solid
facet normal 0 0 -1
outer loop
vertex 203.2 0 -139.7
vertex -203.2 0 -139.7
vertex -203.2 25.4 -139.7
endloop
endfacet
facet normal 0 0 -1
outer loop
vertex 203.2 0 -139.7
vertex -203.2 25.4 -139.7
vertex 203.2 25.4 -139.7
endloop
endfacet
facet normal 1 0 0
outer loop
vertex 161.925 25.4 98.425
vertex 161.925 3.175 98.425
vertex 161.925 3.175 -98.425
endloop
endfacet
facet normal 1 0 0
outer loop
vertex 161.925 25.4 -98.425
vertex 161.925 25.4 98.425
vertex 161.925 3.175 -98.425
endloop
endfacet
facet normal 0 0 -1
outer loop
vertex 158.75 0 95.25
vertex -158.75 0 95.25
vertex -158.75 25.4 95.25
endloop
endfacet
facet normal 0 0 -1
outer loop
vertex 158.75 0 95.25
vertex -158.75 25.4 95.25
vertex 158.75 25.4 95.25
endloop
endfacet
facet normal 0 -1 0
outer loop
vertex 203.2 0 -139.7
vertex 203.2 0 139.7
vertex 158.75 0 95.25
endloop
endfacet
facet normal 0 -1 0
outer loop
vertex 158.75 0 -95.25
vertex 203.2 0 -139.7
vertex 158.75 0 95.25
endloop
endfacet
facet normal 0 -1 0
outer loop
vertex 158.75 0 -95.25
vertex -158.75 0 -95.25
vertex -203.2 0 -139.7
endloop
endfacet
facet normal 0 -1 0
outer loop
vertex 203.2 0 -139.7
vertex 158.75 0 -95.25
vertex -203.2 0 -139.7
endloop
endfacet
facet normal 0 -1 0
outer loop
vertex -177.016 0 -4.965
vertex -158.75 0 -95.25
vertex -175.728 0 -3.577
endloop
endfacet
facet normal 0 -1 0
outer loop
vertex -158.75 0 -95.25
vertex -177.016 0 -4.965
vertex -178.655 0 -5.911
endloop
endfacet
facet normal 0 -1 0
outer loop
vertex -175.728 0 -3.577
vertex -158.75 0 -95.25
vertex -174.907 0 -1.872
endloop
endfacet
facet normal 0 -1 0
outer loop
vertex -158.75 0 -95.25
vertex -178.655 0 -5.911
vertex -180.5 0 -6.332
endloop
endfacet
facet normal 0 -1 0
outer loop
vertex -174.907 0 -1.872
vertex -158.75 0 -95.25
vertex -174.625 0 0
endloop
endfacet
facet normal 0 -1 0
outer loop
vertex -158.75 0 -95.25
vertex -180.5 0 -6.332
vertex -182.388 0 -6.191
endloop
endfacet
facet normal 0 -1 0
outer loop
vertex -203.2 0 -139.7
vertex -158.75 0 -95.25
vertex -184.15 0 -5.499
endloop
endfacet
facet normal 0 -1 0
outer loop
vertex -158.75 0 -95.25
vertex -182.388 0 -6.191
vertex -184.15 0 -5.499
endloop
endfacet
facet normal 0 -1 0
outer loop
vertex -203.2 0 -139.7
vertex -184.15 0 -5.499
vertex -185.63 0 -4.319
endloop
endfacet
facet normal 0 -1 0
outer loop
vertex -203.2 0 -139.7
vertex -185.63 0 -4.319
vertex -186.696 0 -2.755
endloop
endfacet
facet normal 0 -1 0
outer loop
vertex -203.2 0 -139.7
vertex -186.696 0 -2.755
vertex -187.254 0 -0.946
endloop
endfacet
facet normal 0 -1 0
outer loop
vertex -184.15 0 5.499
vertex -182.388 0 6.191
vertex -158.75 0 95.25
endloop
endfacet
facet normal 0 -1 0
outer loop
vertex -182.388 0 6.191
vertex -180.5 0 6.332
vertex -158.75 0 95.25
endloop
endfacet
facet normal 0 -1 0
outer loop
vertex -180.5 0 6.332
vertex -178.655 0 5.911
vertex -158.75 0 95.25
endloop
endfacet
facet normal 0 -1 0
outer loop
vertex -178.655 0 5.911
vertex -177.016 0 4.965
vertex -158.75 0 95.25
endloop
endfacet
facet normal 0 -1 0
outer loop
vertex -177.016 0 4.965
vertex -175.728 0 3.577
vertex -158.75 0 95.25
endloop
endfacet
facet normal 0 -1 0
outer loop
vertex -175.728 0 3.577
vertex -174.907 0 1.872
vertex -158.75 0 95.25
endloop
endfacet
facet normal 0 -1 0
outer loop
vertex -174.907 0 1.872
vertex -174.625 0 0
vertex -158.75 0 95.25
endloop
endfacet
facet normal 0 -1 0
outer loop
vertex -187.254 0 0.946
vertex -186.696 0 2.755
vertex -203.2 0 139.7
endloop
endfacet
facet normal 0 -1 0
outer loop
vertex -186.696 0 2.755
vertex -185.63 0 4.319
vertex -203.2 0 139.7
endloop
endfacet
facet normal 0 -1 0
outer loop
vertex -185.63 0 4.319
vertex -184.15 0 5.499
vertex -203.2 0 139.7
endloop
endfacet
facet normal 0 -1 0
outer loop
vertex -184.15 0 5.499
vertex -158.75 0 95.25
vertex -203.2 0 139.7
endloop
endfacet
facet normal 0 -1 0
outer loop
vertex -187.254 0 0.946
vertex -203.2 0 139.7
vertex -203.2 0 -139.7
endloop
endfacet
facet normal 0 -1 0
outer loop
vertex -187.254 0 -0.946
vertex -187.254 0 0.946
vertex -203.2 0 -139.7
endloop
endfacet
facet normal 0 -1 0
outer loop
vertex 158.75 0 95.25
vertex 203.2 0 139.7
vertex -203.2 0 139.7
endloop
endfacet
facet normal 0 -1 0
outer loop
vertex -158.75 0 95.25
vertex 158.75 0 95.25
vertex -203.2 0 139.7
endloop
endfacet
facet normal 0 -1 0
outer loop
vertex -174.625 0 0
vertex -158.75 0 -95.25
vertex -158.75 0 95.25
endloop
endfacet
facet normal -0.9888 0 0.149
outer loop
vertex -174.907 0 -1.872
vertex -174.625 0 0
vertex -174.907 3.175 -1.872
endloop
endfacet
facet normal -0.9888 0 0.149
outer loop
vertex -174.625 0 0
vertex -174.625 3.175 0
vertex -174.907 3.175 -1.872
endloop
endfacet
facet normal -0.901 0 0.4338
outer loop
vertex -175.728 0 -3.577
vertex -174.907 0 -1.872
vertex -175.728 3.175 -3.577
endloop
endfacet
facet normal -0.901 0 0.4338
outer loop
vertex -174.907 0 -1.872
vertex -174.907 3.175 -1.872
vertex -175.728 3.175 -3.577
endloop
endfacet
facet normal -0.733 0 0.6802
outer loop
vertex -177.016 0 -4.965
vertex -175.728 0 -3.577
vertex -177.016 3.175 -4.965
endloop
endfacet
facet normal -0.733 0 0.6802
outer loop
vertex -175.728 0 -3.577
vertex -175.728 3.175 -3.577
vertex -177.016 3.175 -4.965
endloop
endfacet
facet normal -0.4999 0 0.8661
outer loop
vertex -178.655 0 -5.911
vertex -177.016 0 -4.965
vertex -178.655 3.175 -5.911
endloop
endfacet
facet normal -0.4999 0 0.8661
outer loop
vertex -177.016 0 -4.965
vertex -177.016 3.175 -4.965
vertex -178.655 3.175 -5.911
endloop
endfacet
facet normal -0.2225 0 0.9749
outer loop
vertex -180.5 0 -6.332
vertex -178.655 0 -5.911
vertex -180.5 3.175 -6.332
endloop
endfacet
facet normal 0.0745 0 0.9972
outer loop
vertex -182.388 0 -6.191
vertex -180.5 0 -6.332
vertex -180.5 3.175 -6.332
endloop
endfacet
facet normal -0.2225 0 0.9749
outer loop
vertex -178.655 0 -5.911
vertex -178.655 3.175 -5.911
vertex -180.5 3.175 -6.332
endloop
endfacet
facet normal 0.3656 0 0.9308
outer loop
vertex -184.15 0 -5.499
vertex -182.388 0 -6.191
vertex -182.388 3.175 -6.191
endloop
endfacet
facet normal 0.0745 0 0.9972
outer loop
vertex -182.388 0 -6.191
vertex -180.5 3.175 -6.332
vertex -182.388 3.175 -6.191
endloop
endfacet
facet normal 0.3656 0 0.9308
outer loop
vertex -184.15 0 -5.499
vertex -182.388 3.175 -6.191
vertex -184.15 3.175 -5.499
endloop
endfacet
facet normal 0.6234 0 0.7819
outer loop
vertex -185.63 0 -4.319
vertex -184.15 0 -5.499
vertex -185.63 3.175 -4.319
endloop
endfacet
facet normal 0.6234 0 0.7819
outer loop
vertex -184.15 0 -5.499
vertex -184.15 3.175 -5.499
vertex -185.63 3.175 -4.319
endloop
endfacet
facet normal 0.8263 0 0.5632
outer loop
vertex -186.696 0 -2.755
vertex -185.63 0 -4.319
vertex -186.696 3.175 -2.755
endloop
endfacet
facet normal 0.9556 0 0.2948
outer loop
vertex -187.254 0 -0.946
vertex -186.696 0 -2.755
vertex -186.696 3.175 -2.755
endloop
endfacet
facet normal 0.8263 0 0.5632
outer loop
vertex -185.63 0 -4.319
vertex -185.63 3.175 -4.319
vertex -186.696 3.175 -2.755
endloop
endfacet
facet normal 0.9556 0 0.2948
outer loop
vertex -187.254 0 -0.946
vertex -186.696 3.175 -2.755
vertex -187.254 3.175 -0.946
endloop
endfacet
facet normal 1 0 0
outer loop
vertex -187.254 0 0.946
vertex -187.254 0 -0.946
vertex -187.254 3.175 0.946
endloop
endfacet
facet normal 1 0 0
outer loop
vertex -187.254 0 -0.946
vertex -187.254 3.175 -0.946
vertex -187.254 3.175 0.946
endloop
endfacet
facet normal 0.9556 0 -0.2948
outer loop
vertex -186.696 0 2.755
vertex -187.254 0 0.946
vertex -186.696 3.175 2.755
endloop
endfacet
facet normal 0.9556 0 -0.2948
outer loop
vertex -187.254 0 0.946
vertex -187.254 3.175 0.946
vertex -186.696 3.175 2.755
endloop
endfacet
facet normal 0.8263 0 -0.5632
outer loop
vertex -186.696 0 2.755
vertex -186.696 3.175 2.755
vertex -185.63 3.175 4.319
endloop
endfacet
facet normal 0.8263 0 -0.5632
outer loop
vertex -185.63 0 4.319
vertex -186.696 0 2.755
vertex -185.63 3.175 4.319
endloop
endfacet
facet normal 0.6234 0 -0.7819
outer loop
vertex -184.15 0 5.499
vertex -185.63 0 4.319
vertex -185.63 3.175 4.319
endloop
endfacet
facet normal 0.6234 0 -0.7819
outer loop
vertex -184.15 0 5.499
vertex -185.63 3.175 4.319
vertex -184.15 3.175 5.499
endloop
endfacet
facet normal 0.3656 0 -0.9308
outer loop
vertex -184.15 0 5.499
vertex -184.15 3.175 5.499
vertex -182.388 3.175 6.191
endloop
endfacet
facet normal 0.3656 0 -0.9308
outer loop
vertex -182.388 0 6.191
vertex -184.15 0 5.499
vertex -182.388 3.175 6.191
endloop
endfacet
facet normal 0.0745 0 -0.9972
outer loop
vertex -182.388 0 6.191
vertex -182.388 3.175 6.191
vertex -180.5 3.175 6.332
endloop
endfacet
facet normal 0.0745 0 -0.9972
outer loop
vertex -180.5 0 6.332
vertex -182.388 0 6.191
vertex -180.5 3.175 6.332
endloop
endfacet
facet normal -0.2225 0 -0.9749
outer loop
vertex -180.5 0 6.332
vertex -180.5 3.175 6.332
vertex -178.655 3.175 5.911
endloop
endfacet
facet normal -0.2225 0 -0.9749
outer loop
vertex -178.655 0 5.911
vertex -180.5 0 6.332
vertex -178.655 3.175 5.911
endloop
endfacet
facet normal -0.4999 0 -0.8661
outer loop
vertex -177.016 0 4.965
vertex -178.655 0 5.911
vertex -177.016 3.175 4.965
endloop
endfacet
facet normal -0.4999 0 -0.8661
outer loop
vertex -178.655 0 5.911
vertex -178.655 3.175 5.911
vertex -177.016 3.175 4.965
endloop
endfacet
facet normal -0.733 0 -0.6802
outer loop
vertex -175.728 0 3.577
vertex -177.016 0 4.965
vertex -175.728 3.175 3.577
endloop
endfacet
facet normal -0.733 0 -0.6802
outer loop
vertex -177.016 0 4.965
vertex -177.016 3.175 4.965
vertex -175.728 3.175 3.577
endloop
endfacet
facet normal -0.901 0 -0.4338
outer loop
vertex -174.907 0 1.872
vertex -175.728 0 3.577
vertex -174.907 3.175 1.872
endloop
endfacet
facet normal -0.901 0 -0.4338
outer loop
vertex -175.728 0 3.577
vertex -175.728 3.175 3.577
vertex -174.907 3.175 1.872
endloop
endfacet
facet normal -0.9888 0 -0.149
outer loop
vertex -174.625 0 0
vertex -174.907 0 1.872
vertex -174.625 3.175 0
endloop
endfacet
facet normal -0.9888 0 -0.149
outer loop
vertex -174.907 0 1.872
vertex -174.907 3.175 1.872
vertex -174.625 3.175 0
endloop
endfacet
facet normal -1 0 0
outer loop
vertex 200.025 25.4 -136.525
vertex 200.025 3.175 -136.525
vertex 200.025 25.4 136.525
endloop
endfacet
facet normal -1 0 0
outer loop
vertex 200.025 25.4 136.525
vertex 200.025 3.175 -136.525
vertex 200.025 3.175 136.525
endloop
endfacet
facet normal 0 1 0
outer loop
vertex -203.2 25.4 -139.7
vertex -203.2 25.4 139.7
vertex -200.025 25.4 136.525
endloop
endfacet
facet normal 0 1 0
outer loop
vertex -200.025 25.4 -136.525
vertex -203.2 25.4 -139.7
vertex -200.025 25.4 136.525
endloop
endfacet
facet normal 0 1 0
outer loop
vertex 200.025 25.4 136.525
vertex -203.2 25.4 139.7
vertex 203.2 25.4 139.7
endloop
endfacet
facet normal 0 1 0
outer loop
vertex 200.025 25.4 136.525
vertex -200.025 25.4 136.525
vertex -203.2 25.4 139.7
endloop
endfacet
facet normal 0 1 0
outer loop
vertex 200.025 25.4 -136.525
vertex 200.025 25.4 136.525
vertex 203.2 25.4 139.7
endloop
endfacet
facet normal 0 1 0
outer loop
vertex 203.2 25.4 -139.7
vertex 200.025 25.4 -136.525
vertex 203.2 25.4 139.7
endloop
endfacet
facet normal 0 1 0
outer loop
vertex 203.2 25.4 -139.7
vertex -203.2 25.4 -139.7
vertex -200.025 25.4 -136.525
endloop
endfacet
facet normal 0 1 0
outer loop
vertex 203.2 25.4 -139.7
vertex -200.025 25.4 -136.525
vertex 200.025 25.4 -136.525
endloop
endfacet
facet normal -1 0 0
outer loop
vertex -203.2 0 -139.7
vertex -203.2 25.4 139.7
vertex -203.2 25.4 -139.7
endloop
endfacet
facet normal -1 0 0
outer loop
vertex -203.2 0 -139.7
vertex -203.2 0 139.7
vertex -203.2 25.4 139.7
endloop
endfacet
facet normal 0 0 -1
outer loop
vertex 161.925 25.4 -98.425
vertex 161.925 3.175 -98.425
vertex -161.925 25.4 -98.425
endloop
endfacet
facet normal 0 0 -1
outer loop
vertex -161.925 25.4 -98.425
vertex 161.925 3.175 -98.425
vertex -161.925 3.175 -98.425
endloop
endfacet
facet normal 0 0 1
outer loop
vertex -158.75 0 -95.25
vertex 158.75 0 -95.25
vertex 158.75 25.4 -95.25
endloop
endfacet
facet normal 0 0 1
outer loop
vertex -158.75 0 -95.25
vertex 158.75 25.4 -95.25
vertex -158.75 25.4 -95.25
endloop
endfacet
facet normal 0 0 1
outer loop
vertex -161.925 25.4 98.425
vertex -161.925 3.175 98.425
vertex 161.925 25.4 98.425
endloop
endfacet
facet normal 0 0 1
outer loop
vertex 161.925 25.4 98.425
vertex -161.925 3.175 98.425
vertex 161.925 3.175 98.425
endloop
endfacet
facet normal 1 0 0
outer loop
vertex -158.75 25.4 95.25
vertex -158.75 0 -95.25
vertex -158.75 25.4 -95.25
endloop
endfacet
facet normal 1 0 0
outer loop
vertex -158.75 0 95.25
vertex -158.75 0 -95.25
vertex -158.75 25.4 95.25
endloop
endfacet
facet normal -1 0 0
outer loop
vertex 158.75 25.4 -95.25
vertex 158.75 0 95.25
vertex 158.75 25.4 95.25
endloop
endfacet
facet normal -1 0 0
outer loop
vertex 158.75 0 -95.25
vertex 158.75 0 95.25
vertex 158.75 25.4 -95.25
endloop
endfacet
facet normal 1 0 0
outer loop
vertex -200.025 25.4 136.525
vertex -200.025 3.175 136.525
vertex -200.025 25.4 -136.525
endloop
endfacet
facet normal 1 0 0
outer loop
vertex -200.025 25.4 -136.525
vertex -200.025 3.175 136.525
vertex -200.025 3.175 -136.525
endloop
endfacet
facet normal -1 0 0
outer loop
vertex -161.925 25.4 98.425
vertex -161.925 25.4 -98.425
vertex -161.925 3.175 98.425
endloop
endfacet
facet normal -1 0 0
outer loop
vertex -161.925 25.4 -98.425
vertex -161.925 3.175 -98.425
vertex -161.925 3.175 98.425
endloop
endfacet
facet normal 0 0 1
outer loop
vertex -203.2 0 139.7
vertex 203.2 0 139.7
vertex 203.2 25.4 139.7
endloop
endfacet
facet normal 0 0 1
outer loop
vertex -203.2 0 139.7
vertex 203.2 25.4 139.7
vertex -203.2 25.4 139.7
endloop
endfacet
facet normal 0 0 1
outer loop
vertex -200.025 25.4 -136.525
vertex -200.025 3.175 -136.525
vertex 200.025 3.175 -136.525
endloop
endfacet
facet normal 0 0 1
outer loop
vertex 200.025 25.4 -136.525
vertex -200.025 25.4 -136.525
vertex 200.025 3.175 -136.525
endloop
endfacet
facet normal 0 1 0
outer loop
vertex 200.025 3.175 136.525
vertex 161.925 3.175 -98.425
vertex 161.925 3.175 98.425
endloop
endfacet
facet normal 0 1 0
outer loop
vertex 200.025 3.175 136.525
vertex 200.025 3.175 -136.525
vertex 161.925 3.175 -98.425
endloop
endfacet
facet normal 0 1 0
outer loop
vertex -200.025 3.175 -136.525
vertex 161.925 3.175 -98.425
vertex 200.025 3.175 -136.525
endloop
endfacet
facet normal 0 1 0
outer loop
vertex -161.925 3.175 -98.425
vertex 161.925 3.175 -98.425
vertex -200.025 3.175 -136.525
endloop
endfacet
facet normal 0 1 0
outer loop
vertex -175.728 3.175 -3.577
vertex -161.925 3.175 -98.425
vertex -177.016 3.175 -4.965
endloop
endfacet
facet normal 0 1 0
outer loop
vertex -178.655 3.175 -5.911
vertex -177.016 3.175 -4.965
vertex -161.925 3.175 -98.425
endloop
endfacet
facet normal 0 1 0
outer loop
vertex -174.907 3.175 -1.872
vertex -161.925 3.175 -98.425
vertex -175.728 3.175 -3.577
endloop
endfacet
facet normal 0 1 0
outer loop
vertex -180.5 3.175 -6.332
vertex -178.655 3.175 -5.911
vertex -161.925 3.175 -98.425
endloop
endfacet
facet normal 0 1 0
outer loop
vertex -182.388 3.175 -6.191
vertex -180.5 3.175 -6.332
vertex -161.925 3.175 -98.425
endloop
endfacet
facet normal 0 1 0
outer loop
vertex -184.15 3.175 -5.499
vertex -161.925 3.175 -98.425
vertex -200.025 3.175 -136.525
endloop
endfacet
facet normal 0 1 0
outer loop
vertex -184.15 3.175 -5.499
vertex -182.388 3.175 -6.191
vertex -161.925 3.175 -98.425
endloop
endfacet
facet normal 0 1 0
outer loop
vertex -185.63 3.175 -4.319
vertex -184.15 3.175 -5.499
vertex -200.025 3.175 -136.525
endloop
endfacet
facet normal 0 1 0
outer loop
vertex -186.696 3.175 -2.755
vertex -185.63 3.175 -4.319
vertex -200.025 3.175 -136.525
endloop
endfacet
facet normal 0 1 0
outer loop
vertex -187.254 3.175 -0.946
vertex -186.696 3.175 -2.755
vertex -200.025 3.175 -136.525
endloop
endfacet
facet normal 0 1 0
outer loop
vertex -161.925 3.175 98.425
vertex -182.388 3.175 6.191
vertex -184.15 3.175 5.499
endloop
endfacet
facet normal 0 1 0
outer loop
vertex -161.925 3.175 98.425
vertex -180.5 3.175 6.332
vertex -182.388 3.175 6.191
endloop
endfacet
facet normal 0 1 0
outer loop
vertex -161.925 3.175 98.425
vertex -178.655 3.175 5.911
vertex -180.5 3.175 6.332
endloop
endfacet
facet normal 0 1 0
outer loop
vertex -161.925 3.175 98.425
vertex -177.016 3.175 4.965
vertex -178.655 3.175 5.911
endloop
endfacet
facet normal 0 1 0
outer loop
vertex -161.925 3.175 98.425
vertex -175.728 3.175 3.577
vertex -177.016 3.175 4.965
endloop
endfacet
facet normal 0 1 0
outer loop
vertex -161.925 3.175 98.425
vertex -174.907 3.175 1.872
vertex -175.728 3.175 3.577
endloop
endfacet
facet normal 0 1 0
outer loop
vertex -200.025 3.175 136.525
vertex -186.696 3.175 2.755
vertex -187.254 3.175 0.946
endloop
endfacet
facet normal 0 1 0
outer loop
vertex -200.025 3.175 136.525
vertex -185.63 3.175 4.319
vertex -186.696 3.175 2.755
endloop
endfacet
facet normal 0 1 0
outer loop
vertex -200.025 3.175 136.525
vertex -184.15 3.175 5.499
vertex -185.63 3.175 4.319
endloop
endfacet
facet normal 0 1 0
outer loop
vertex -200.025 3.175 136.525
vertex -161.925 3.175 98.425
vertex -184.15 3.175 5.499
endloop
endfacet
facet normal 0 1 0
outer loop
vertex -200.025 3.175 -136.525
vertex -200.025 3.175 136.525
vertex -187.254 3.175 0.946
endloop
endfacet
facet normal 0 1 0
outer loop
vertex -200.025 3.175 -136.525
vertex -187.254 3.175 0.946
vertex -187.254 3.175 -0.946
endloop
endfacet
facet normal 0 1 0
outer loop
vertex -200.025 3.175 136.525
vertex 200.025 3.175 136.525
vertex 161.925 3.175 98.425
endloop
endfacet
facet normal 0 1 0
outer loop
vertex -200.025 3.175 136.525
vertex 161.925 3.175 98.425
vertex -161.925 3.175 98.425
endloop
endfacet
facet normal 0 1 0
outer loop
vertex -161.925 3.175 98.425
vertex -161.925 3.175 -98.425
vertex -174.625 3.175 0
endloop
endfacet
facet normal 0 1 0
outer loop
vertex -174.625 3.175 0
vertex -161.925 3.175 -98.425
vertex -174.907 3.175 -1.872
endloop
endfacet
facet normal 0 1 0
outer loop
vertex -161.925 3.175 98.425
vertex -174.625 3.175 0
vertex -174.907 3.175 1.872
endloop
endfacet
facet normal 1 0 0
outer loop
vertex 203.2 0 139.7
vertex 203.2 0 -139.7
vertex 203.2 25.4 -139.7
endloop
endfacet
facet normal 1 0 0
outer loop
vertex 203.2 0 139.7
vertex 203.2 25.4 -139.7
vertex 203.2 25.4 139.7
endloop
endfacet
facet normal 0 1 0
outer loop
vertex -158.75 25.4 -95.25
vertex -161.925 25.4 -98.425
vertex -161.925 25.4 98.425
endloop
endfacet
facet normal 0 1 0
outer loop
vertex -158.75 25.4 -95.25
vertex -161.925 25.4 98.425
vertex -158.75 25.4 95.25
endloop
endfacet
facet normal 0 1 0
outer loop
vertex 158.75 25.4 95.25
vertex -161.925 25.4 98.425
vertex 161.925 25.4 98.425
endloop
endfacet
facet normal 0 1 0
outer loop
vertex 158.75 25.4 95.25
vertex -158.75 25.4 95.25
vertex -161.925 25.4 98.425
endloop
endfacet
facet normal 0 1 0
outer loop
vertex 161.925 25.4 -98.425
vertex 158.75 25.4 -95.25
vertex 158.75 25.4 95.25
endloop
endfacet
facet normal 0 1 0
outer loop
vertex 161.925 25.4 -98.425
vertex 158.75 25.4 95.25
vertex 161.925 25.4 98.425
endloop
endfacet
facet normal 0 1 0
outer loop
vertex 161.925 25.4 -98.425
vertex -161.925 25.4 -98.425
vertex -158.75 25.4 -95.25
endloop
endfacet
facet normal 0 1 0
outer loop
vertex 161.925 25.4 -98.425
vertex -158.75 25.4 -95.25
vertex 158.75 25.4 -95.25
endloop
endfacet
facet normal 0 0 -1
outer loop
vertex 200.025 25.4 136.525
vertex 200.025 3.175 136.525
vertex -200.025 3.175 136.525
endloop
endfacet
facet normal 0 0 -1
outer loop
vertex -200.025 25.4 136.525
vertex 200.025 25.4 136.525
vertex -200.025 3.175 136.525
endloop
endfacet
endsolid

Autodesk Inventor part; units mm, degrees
ref_plane "YZ Plane" through (0, 0, 0) normal (1, 0, 0) x (0, 1, 0)
ref_plane "XZ Plane" through (0, 0, 0) normal (0, 1, 0) x (-1, 0, 0)
ref_plane "XY Plane" through (0, 0, 0) normal (0, 0, 1) x (1, 0, 0)
sketch "Sketch3" plane through (0, 0, 0) normal (0, 1, 0) x (-1, 0, 0)
  line L0 (-203.2, 139.7) -> (203.2, 139.7)
  line L1 (203.2, 139.7) -> (203.2, -139.7)
  line L2 (203.2, -139.7) -> (-203.2, -139.7)
  line L3 (-203.2, -139.7) -> (-203.2, 139.7)
  line L4 (-203.2, 139.7) -> (203.2, -139.7) construction
  line L5 (203.2, 139.7) -> (-203.2, -139.7) construction
  line L6 (152.4, -88.9) -> (152.4, 88.9)
  line L7 (152.4, 88.9) -> (-152.4, 88.9)
  line L8 (-152.4, 88.9) -> (-152.4, -88.9)
  line L9 (-152.4, -88.9) -> (152.4, -88.9)
  line L10 (158.75, -95.25) -> (158.75, 95.25)
  line L11 (158.75, 95.25) -> (-158.75, 95.25)
  line L12 (-158.75, 95.25) -> (-158.75, -95.25)
  line L13 (-158.75, -95.25) -> (158.75, -95.25)
  point P0 (0, 0)
  dimension "d11" = 406.4
  dimension "d12" = 279.4
  dimension "d13" = 50.8
  dimension "d14" = 44.45
extrude "Extrusion3" add sketch "Sketch3" along normal blind 50.8 contours L0 L1 L2 L3
shell "Shell2" thickness 3.175 removed faces 1 at (52.9167, 50.8, -124.8833)
sketch "Sketch4" plane through (0, 50.8, 0) normal (0, 1, 0) x (1, 0, 0)
  line L0 (227.9599, -165.6341) -> (-227.9599, -165.6341)
  line L1 (-227.9599, -165.6341) -> (-227.9599, 165.6341)
  line L2 (-227.9599, 165.6341) -> (227.9599, 165.6341)
  line L3 (227.9599, 165.6341) -> (227.9599, -165.6341)
  line L4 (227.9599, -165.6341) -> (-227.9599, 165.6341) construction
  line L5 (-227.9599, -165.6341) -> (227.9599, 165.6341) construction
  point P0 (0, 0)
extrude "Extrusion4" cut sketch "Sketch4" against normal blind 25.4
sketch "Sketch5" plane through (-200.025, 3.175, 136.525) normal (0, 1, 0) x (1, 0, 0)
  line L0 (361.95, 234.95) -> (38.1, 234.95) projected
  line L1 (361.95, 38.1) -> (361.95, 234.95) projected
  line L2 (38.1, 38.1) -> (361.95, 38.1) projected
  line L3 (38.1, 234.95) -> (38.1, 38.1) projected
  line L4 (400.05, 0) -> (0, 0) projected
  line L5 (400.05, 273.05) -> (400.05, 0) projected
  line L6 (0, 273.05) -> (400.05, 273.05) projected
  line L7 (0, 0) -> (0, 273.05) projected
  line L8 (38.1, 38.1) -> (0, 38.1)
  line L9 (0, 38.1) -> (0, 234.95)
  line L10 (0, 234.95) -> (38.1, 234.95)
  line L11 (38.1, 234.95) -> (38.1, 38.1)
  circle A0 centre (19.05, 136.525) radius 6.35
  point P0 (200.025, 136.525)
  dimension "d20" = 12.7
extrude "Extrusion5" cut sketch "Sketch5" against normal blind 25.4 contours A0
properties part number "Catch pan" material "Aluminum 6061"
